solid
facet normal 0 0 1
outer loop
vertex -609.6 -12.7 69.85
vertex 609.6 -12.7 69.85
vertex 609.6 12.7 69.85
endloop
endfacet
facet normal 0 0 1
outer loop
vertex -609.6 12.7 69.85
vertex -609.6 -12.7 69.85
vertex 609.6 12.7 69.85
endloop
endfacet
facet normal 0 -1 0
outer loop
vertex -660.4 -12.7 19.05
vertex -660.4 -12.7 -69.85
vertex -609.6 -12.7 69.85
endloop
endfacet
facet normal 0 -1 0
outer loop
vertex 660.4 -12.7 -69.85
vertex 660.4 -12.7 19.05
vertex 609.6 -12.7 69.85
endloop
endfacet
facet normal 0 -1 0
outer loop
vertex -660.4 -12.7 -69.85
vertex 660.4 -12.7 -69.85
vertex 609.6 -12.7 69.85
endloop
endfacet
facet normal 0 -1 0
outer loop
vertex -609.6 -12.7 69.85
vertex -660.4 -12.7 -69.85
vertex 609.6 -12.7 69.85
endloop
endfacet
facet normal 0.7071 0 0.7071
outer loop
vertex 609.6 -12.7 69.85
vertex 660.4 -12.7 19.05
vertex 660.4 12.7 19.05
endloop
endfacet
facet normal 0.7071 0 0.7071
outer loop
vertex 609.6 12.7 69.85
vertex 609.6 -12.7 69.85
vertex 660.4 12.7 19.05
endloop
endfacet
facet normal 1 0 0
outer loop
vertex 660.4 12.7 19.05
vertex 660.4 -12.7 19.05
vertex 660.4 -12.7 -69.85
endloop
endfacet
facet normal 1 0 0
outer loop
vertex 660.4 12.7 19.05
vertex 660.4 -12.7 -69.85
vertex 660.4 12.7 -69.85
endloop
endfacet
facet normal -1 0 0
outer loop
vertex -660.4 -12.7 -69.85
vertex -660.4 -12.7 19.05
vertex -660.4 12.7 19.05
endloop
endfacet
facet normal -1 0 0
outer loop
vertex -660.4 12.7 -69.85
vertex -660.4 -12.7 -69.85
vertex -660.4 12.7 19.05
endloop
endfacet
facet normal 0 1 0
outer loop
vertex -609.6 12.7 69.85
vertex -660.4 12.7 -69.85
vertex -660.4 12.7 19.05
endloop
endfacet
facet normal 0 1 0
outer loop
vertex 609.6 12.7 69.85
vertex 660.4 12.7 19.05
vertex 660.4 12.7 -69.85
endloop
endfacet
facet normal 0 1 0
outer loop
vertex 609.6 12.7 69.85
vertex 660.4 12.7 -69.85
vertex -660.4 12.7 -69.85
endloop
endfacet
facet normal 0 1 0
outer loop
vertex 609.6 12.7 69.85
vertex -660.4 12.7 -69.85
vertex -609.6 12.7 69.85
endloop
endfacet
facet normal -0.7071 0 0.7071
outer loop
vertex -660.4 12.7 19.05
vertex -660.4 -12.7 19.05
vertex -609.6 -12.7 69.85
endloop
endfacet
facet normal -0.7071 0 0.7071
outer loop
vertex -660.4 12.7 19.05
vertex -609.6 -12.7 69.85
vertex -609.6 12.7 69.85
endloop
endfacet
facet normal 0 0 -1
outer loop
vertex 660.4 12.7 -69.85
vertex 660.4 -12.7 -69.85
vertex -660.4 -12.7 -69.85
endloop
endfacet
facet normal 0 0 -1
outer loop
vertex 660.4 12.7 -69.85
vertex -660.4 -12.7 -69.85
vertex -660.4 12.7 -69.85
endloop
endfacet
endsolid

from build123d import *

# Parameters (mm, degrees)
F0_W     = 25.4
F0_H     = 139.7
F1_DEPTH = 660.4
F2_SIZE  = 50.8


with BuildPart() as f1:
    # F0 (on Right) → F1 (new body, symmetric)
    with BuildSketch(Plane.YZ):
        Rectangle(F0_W, F0_H)
    extrude(amount=F1_DEPTH, both=True)

    # F2
    f2_edges = [f1.edges().sort_by_distance(p)[0] for p in [
        (660.4, 0, 69.85),
        (-660.4, 0, 69.85),
    ]]
    chamfer(f2_edges, length=F2_SIZE)


solid = f1.part
